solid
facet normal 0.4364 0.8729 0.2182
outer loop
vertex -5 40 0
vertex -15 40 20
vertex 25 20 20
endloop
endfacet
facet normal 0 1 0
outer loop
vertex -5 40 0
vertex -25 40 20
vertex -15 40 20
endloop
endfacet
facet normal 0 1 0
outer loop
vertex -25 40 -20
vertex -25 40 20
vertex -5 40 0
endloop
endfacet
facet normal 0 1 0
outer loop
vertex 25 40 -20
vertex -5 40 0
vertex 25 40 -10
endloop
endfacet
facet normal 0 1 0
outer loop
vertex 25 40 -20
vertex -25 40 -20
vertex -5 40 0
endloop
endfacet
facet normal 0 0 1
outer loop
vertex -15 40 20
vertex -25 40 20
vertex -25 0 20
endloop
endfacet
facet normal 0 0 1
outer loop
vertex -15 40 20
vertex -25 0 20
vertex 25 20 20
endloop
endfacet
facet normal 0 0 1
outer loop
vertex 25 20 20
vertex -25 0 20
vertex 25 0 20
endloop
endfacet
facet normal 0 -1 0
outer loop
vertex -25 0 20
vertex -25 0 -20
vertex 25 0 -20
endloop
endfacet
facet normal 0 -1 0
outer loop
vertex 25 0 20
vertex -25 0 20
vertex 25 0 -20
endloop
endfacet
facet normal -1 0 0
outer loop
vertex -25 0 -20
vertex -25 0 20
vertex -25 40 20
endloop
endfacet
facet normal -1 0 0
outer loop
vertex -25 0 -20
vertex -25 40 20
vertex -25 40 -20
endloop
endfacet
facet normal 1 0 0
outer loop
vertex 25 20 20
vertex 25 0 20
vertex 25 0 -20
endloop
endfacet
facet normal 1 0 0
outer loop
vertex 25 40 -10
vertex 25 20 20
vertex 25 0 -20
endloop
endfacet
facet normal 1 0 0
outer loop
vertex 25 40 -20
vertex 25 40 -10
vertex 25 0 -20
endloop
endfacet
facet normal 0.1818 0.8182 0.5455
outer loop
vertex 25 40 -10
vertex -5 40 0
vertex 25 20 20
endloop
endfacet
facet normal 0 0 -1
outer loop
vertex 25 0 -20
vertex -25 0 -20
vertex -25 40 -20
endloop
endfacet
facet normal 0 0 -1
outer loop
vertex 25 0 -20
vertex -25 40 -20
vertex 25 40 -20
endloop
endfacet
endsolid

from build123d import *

# Parameters (mm, degrees)
SKETCH1_W           = 50
SKETCH1_H           = 40
BOSS_EXTRUDE1_DEPTH = 40
CUT_LOFT1_START     = -23.040884378
CUT_LOFT1_DEPTH     = 41.231056256


# Read off the part's stored shape, not the designer's step: Cut-Loft1
with BuildPart() as part:
    # Sketch1 → Boss-Extrude1 (new body)
    with BuildSketch(Plane(origin=(0, 0, 0), x_dir=(1, 0, 0), z_dir=(0, 1, 0))):
        Rectangle(SKETCH1_W, SKETCH1_H)
    extrude(amount=BOSS_EXTRUDE1_DEPTH)

    # Cut-Loft1 outline → Cut-Loft1 (cut)
    with BuildSketch(Plane(origin=(0, 0, 0), x_dir=(0.6859943405700354, 0.5144957554275265, -0.5144957554275265), z_dir=(0.7276068751089988, -0.4850712500726662, 0.4850712500726662)).offset(CUT_LOFT1_START)):
        Polygon((-1.908261965, 44), (0, 42.426406871), (17.149858514, 28.284271247), (42.874646286, 21.213203436), (44, 20.903873287), (44, 44), align=None)
    extrude(amount=CUT_LOFT1_DEPTH, mode=Mode.SUBTRACT)


solid = part.part
